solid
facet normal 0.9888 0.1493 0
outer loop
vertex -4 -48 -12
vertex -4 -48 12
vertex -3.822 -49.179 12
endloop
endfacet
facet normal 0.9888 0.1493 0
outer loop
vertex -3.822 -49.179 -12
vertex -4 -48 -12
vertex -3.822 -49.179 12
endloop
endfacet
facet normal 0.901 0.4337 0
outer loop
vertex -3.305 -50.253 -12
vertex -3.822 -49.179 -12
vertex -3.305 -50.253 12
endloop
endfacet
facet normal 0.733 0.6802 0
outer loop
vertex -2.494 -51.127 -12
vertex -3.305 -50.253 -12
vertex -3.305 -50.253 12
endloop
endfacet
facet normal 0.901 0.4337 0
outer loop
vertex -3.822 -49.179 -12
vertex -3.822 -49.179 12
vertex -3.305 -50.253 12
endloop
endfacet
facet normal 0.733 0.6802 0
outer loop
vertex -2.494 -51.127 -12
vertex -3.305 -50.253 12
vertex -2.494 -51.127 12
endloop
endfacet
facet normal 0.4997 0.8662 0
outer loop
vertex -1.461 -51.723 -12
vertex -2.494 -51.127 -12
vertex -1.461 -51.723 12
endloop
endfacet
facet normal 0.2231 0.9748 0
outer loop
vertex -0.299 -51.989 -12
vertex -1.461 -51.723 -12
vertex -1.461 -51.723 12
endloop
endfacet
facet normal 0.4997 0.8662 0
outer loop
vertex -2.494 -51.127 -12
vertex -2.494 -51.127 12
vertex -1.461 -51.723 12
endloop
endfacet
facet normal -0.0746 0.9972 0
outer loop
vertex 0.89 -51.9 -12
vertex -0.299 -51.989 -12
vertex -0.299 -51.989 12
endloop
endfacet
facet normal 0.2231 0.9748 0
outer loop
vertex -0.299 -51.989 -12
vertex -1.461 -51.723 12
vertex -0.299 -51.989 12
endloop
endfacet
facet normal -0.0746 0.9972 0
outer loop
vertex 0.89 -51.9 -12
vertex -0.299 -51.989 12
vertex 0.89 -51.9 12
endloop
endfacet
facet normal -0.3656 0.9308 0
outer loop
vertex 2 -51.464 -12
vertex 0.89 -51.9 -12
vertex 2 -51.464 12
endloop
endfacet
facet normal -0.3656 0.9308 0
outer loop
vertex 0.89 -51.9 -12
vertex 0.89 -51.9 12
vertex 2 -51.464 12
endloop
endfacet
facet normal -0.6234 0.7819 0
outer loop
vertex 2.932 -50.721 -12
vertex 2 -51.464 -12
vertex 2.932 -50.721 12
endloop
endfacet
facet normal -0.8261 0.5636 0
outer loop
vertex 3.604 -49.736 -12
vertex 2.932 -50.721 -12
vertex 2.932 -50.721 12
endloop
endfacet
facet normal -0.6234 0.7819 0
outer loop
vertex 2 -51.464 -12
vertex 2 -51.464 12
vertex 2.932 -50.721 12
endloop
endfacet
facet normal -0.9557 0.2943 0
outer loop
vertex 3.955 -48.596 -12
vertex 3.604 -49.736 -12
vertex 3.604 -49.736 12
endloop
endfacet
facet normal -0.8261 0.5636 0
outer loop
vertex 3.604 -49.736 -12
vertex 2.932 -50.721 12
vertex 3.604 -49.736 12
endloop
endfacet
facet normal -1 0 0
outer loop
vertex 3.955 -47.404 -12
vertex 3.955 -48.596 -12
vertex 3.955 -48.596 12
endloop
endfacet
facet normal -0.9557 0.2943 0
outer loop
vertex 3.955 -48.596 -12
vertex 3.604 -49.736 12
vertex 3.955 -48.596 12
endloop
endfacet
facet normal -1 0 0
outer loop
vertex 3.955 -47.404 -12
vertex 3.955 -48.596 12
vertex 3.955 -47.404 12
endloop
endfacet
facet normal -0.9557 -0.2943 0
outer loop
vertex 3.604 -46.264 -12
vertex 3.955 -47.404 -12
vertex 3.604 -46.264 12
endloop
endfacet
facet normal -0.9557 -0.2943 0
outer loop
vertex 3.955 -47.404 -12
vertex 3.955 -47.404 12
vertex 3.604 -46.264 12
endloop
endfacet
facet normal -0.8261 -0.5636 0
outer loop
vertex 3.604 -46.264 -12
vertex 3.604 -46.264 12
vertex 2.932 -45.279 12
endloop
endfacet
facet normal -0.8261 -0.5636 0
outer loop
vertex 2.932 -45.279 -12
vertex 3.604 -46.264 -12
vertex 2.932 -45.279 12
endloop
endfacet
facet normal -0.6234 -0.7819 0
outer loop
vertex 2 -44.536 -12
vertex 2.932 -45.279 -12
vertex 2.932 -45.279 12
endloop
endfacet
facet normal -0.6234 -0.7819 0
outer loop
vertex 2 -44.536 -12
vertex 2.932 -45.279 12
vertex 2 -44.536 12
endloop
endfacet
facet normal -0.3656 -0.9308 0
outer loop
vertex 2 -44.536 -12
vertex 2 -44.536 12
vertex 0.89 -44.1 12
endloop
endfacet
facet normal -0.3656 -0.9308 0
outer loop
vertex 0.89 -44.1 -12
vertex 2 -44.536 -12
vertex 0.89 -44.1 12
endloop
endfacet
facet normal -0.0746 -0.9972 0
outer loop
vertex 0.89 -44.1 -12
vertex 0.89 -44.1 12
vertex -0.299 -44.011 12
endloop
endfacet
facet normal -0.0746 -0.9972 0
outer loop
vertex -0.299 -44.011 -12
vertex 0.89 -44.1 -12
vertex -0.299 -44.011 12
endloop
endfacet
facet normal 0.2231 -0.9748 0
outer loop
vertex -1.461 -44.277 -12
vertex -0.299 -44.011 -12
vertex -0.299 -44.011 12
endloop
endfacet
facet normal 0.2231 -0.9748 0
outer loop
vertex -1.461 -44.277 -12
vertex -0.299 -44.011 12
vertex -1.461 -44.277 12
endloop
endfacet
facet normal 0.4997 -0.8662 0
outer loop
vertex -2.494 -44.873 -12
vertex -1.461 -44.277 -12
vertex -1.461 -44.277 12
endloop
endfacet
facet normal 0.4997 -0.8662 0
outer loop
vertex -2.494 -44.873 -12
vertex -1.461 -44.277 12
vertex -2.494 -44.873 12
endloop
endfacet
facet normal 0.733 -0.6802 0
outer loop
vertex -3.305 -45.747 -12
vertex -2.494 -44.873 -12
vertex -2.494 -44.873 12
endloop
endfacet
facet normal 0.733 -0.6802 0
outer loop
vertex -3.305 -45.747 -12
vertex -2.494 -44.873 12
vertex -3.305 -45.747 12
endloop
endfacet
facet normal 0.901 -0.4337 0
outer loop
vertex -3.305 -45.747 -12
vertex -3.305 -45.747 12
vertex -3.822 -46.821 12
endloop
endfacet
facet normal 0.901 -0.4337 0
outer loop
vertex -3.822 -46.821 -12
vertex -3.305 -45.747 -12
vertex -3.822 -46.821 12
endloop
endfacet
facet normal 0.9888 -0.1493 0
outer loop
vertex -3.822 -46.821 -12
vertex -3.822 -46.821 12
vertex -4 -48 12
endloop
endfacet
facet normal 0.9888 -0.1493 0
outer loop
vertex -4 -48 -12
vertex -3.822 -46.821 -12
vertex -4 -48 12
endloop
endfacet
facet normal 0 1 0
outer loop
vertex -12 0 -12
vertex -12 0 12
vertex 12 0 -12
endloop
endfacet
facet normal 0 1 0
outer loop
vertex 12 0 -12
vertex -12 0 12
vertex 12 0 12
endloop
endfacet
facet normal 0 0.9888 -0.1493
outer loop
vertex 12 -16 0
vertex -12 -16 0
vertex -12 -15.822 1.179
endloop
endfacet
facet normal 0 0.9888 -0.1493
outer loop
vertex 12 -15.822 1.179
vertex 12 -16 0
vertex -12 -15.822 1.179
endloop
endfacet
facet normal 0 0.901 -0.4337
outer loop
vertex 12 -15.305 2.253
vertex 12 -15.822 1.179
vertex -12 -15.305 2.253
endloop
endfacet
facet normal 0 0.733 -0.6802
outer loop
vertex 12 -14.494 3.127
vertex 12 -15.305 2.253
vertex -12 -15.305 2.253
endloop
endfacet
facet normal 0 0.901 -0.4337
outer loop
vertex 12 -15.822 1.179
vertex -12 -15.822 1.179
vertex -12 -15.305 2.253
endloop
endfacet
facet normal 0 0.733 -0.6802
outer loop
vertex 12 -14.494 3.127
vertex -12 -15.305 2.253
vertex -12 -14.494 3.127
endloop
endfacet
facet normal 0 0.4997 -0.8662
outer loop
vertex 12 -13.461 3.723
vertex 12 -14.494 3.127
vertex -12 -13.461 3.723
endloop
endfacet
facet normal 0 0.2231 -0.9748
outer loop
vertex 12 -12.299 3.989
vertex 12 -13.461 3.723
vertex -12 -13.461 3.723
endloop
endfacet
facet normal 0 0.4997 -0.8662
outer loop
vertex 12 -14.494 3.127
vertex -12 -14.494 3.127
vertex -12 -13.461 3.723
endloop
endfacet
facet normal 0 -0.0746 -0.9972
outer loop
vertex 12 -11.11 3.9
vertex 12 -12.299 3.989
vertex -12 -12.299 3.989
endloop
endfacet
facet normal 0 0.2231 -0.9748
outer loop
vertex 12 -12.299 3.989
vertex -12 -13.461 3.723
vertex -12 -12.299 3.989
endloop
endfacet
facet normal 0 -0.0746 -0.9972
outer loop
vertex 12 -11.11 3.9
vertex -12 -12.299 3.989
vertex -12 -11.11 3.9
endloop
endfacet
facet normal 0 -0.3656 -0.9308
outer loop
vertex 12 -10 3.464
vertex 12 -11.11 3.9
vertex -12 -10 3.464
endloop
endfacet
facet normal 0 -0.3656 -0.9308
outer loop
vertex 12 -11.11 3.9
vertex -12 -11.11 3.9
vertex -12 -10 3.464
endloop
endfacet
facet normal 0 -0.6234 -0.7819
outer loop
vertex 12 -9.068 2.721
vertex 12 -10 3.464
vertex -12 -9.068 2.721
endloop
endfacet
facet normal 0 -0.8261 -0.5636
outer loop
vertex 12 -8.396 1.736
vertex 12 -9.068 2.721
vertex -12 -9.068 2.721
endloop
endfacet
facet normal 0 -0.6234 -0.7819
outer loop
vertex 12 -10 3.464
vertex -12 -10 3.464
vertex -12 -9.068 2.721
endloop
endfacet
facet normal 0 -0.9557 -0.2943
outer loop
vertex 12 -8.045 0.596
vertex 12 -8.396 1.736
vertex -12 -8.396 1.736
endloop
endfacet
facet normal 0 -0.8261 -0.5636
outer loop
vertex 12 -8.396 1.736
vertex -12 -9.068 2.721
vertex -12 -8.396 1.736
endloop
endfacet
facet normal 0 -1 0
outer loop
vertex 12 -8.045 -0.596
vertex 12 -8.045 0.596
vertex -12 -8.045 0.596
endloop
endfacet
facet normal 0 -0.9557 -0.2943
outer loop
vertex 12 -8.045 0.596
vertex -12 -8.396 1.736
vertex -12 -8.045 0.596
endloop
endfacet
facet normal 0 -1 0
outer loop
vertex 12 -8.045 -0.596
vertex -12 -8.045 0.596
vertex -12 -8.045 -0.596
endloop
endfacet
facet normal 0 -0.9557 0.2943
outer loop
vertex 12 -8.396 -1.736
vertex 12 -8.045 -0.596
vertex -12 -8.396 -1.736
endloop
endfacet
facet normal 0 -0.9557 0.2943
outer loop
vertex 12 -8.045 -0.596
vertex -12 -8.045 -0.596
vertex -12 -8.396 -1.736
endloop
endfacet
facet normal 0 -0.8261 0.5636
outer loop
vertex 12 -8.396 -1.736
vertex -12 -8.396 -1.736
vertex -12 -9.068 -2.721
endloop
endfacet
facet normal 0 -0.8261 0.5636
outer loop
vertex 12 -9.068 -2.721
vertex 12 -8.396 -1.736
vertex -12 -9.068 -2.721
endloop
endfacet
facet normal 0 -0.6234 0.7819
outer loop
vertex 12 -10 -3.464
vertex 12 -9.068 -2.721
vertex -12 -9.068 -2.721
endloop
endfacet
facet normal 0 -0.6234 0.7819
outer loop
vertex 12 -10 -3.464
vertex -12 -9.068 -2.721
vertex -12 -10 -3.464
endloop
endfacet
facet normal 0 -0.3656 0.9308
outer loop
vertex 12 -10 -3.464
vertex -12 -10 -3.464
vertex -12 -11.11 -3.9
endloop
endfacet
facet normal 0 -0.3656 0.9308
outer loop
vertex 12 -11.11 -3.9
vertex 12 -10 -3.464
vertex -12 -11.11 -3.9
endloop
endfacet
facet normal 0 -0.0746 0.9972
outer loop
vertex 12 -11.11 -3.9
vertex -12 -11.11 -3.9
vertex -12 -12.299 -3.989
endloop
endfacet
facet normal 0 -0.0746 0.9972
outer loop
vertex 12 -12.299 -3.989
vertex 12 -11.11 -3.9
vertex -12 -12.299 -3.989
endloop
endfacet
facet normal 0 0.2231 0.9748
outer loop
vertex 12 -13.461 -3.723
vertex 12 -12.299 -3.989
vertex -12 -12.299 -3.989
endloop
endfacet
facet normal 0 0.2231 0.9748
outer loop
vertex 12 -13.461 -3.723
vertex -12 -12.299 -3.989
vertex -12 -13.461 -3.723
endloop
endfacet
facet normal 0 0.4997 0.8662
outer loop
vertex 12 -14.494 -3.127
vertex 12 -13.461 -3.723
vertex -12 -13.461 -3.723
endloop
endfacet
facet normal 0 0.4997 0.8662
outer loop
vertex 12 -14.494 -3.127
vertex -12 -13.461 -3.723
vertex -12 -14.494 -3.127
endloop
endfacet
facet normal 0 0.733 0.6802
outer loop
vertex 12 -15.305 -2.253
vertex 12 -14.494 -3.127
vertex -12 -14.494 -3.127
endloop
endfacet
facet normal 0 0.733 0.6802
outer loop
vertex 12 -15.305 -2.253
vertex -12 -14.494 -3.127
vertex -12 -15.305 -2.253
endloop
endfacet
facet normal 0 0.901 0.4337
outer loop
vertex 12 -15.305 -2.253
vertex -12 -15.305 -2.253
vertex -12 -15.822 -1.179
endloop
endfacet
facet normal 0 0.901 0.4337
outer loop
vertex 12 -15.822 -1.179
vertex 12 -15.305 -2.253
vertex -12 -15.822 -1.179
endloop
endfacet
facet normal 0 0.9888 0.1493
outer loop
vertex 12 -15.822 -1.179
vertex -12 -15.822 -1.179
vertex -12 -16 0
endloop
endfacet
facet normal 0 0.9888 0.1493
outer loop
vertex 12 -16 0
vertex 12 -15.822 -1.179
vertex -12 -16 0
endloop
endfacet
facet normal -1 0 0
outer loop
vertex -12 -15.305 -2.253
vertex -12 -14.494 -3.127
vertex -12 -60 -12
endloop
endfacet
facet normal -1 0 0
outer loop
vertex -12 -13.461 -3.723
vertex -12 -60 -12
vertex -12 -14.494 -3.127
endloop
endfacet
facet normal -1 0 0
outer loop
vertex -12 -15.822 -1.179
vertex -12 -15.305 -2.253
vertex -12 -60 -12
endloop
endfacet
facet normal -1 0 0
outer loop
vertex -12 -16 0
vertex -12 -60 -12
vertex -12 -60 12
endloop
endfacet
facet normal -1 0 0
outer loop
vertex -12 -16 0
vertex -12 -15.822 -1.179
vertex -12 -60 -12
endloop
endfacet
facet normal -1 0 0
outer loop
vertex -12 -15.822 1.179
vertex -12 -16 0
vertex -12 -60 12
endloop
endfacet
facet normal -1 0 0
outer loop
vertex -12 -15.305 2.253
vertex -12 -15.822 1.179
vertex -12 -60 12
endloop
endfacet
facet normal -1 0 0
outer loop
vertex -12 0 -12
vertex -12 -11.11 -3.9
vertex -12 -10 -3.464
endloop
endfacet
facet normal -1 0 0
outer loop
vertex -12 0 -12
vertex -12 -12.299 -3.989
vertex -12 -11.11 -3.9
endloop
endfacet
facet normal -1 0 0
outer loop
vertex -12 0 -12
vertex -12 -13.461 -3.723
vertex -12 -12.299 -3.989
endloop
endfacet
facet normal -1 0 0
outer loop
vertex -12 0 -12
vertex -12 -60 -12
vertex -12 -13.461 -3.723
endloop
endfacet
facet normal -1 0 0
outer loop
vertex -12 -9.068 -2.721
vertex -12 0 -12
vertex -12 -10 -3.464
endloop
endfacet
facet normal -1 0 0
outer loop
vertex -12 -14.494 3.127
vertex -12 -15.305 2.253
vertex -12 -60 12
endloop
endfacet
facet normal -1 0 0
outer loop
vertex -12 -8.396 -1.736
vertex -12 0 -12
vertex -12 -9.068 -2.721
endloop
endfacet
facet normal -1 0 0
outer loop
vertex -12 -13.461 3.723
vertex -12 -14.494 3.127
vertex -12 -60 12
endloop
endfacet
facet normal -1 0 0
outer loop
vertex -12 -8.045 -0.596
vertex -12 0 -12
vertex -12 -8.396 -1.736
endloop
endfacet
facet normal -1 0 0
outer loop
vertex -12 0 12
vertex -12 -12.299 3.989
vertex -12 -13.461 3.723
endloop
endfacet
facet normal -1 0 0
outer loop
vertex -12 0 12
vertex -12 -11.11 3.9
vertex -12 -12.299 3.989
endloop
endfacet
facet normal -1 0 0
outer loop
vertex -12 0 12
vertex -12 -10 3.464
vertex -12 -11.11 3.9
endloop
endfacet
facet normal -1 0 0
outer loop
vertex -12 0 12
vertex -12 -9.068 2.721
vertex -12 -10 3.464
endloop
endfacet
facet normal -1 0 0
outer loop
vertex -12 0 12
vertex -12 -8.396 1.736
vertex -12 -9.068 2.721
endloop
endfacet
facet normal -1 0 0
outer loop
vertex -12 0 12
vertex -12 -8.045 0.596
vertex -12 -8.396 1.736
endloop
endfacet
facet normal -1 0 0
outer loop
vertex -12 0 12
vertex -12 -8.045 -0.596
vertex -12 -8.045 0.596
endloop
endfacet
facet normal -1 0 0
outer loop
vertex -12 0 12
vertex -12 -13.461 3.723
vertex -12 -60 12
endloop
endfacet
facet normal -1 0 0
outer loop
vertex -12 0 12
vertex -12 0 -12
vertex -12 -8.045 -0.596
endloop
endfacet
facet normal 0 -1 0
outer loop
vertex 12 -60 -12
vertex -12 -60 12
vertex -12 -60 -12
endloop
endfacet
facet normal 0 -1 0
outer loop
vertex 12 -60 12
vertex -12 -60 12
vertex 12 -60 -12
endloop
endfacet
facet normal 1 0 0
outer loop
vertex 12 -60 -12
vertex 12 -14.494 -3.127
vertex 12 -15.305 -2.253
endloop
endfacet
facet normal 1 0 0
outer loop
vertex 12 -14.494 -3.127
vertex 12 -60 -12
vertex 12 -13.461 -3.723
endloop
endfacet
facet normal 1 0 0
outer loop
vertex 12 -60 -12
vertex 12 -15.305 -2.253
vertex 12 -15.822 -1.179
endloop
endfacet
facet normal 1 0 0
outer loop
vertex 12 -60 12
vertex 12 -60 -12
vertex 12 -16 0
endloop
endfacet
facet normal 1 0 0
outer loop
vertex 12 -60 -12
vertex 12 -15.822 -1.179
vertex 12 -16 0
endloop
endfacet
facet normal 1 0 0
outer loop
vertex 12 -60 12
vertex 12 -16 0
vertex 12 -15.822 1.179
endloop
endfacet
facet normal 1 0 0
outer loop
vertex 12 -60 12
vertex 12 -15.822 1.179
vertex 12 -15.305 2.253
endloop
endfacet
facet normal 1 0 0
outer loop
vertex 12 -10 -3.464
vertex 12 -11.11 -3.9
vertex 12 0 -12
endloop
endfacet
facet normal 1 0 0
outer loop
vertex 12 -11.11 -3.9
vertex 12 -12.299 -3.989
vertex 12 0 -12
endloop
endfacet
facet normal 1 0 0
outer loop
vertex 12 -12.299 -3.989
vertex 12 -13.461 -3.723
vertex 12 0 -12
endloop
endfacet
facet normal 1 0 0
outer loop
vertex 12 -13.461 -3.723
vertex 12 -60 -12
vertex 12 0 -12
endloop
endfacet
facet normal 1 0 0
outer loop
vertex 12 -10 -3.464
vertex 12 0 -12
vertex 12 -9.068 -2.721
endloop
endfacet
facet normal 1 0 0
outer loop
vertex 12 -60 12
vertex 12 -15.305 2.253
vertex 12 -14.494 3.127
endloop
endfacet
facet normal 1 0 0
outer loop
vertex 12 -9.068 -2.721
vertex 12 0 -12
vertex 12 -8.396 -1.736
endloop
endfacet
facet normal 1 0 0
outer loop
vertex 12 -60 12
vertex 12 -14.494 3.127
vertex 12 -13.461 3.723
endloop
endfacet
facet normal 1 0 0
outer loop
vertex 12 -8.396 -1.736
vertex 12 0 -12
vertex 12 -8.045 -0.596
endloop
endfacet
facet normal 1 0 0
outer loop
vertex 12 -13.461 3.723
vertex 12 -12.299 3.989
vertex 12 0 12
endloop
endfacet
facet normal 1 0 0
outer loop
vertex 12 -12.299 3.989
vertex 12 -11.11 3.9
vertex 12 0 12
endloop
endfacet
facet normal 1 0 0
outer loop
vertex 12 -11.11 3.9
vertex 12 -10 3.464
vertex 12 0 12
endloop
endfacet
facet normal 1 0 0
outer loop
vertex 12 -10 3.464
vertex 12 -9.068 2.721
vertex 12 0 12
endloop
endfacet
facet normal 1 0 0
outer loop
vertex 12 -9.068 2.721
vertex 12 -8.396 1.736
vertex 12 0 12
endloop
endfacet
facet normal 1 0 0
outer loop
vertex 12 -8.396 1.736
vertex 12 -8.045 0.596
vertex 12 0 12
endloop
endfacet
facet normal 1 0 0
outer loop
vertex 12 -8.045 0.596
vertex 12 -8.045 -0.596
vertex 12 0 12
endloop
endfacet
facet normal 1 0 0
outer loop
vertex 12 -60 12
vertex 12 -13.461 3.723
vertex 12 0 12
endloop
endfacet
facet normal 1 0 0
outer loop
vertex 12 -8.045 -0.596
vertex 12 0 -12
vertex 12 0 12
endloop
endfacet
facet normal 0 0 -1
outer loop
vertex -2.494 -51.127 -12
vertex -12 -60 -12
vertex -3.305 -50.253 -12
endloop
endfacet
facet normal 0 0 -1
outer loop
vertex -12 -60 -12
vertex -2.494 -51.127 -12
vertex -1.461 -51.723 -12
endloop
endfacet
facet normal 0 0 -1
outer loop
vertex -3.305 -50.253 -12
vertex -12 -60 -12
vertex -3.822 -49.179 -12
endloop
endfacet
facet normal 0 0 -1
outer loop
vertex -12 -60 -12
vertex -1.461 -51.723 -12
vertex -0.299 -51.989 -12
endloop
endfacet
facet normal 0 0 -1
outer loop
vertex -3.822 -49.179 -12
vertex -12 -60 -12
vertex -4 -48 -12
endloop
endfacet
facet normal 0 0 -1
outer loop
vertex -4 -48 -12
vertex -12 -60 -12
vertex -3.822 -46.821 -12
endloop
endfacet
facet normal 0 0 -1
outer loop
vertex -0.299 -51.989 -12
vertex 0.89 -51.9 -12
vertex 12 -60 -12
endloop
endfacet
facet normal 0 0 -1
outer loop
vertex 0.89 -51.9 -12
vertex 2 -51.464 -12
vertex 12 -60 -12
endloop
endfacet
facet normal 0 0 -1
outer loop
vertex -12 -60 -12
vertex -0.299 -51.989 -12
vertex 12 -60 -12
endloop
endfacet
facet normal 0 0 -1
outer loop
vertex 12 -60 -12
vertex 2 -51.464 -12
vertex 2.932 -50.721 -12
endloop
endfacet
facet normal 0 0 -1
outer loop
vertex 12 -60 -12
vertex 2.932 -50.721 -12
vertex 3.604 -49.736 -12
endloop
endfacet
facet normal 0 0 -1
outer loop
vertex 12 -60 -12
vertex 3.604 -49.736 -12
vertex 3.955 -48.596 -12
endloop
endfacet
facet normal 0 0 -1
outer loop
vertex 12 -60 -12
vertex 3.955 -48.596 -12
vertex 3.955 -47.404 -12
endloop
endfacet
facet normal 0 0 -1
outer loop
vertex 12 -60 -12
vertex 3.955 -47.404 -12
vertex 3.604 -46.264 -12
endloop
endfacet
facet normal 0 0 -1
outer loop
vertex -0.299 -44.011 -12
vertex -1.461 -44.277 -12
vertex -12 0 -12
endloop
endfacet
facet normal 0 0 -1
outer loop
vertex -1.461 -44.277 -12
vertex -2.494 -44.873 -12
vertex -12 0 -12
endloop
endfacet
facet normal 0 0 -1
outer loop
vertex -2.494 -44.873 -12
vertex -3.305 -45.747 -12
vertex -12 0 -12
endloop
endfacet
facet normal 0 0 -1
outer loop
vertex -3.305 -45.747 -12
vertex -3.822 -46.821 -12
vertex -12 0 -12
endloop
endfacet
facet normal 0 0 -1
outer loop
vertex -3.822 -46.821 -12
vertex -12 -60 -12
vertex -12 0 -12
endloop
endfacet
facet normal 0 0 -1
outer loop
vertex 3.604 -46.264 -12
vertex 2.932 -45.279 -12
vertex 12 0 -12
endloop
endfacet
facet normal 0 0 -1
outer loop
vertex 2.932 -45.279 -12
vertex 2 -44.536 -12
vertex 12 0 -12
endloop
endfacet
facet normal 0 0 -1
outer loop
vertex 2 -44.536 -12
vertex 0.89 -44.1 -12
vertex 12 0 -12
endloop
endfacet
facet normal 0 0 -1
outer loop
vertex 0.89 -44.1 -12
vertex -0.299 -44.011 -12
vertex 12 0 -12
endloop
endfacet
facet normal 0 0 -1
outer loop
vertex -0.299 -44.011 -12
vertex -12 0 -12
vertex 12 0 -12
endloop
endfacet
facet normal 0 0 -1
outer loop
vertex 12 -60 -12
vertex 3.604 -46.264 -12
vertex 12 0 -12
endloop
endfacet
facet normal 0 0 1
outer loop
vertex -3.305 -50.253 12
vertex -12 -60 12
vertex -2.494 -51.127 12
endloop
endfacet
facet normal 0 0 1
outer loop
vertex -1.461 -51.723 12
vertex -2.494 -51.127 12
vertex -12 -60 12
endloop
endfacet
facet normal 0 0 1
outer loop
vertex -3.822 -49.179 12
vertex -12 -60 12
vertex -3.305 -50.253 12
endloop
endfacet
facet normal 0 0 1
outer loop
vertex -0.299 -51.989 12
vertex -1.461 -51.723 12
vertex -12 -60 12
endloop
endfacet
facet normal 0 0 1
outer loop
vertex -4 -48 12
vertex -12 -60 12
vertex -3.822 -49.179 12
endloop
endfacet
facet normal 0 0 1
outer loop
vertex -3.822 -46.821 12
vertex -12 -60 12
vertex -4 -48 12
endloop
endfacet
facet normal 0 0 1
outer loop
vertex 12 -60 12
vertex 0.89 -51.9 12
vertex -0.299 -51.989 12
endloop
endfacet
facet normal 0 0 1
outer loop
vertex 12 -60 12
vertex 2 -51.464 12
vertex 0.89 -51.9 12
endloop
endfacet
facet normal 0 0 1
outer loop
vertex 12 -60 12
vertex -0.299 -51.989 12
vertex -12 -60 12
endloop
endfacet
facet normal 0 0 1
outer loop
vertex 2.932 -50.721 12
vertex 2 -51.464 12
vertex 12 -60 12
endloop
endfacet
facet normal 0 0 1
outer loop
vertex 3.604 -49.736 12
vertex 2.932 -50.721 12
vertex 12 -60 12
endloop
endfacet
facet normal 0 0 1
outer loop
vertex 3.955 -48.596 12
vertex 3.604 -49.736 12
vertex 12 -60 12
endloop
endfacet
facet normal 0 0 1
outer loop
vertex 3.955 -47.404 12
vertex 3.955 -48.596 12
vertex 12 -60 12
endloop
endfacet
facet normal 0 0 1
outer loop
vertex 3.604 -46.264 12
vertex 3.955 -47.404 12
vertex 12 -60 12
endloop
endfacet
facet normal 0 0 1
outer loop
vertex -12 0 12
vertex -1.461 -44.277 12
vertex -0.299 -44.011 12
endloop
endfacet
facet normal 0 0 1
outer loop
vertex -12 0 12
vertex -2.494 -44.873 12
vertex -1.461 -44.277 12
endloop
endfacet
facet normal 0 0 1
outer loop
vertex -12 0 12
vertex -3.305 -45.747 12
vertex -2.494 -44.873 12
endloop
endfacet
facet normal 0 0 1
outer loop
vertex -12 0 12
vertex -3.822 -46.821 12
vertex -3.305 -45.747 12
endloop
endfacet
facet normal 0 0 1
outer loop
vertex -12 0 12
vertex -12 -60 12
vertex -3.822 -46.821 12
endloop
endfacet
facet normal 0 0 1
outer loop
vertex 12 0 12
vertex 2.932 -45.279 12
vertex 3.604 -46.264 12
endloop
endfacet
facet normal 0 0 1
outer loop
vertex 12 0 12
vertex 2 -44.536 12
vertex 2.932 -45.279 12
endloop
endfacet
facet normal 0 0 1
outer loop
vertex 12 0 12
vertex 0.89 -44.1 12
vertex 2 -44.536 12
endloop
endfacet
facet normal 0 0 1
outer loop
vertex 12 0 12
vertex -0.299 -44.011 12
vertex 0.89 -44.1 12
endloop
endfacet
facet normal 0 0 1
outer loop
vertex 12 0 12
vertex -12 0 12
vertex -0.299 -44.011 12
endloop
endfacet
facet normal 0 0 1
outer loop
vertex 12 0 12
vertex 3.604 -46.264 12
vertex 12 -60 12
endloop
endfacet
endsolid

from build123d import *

# Parameters (mm, degrees)
F0_W       = 24
F0_H       = 24
F1_DEPTH   = 60
F4_D       = 8
F4_ON_F2_D = 8


with BuildPart() as f1:
    # F0 (on Front) → F1 (new body)
    with BuildSketch(Plane.XZ):
        Rectangle(F0_W, F0_H)
    extrude(amount=F1_DEPTH)

    # F4 (through all)
    with Locations(Plane.YZ.offset(12)):
        with Locations((-12, 0)):
            Hole(F4_D / 2)

    # F4 on F2 (through all)
    with Locations(Plane(origin=(0, 0, -12), x_dir=(1, 0, 0), z_dir=(0, 0, -1))):
        with Locations((0, 48)):
            Hole(F4_ON_F2_D / 2)


solid = f1.part
